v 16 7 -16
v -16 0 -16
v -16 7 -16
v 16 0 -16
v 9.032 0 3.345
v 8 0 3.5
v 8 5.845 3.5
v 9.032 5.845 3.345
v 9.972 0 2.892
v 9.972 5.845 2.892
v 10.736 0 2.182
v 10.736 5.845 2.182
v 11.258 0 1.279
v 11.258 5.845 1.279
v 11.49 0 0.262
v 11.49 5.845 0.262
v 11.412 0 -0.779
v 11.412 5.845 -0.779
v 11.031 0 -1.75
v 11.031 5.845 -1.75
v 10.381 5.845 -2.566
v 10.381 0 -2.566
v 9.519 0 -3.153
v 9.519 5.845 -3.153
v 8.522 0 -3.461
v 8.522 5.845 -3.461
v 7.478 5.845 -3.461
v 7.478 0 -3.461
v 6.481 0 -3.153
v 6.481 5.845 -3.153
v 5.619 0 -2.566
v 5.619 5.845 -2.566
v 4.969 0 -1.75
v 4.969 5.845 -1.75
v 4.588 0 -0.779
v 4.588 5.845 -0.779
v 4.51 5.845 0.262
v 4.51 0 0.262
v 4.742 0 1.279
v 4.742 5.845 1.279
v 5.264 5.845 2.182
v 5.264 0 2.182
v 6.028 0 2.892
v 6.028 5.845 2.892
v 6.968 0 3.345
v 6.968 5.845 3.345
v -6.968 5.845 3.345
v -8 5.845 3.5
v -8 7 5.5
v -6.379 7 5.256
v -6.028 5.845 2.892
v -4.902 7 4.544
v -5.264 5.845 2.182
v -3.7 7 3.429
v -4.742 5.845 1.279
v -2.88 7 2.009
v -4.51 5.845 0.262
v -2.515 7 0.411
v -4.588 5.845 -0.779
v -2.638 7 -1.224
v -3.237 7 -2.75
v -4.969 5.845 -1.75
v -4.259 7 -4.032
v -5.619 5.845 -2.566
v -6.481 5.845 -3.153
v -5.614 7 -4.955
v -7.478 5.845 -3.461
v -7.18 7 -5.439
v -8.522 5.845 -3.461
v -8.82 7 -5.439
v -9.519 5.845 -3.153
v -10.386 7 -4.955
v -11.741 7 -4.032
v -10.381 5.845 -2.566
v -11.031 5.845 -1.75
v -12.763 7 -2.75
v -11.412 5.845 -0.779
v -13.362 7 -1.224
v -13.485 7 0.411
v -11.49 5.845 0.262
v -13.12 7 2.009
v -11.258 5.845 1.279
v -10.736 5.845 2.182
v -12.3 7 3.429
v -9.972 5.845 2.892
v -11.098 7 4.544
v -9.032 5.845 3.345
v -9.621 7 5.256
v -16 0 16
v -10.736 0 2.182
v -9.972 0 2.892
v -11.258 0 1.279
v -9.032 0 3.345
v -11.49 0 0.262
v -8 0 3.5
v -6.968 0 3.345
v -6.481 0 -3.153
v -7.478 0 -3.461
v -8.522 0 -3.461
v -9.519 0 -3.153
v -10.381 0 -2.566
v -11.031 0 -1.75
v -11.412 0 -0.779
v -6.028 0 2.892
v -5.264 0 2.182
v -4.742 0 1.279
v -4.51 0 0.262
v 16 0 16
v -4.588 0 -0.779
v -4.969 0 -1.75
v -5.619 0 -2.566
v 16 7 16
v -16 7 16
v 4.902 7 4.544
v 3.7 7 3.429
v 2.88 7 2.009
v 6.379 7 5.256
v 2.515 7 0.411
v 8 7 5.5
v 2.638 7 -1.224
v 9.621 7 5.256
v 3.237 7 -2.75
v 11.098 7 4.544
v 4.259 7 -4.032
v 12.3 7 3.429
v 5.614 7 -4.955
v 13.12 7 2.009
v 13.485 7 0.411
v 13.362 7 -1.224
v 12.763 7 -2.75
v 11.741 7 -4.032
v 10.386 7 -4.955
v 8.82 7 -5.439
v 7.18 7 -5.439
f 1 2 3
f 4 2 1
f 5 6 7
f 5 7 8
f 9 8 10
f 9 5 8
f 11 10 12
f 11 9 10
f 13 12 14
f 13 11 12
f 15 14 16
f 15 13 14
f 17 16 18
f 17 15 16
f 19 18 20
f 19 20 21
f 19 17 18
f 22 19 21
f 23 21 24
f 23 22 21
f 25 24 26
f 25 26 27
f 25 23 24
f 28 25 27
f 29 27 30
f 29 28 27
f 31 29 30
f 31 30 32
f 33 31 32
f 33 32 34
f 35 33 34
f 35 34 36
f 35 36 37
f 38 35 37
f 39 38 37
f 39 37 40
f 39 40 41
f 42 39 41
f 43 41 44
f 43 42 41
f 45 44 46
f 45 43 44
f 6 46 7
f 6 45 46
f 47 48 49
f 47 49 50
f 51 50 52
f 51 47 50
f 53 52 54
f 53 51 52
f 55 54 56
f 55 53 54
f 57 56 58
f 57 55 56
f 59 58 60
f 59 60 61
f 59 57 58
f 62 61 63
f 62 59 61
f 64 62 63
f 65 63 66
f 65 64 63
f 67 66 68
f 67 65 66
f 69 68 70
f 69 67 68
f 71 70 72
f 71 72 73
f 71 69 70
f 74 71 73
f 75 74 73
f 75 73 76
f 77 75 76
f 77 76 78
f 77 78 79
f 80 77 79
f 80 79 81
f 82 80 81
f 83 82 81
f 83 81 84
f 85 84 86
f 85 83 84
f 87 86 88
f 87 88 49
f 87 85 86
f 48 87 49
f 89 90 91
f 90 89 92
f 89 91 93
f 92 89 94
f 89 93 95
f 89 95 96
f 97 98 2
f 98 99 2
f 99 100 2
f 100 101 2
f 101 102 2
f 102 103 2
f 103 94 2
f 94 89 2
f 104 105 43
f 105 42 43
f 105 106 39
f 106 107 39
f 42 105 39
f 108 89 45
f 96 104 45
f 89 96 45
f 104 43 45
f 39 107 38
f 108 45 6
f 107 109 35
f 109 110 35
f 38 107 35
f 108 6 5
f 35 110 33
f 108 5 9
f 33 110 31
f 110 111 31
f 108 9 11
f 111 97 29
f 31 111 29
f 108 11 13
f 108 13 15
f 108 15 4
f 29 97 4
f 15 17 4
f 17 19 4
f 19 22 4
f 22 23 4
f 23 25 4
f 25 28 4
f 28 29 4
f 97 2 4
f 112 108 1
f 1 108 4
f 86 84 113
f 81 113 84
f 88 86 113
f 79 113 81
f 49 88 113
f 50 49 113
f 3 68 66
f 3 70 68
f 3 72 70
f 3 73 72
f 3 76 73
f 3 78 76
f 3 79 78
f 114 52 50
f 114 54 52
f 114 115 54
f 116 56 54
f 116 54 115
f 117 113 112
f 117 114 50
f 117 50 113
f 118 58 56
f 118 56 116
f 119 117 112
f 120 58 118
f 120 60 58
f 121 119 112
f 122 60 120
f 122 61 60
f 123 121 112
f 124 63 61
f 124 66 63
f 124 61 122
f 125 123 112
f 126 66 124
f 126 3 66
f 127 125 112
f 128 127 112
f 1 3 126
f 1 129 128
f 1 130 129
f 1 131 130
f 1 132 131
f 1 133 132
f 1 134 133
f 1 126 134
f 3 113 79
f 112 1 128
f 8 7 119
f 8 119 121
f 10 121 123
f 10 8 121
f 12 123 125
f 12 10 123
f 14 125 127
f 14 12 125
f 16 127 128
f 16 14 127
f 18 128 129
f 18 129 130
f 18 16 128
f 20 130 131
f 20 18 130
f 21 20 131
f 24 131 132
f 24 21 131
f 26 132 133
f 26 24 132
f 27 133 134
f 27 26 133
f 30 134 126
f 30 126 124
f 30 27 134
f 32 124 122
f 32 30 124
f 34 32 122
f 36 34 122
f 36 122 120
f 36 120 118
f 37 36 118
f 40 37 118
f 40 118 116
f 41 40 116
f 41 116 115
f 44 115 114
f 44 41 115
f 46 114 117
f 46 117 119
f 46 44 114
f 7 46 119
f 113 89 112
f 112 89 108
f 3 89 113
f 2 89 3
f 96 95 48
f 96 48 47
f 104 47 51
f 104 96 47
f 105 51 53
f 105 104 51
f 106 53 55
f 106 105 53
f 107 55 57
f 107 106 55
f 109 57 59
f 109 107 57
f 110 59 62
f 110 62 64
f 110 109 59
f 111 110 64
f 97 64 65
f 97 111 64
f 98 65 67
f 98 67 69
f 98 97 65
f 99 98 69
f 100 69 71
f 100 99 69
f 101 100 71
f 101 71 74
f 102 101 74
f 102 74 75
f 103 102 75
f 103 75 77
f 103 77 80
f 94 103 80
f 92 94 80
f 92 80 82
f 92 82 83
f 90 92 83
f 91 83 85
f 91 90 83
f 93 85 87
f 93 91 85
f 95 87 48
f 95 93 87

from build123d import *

# Parameters (mm, degrees)
SKETCH1_W           = 32
SKETCH1_H           = 32
SKETCH1_R           = 3.5
BOSS_EXTRUDE1_DEPTH = 7
CHAMFER2_SIZE       = 2
CHAMFER2_SIZE2      = 1.154700538


with BuildPart() as part:
    # Sketch1 → Boss-Extrude1 (new body)
    with BuildSketch(Plane(origin=(0, 0, 0), x_dir=(1, 0, 0), z_dir=(0, 1, 0))):
        Rectangle(SKETCH1_W, SKETCH1_H)
        with Locations(Location((-8, 0, 0), (0, 0, 270))):
            Circle(SKETCH1_R, mode=Mode.SUBTRACT)
        with Locations(Location((8, 0, 0), (0, 0, 270))):
            Circle(SKETCH1_R, mode=Mode.SUBTRACT)
    extrude(amount=BOSS_EXTRUDE1_DEPTH)

    # Chamfer2
    chamfer2_edges = [part.edges().sort_by_distance(p)[0] for p in [
        (-8, 7, -3.5),
        (8, 7, -3.5),
    ]]
    chamfer2_side = [part.faces().sort_by_distance(p)[0] for p in [
        (0, 7, 0),
    ]]
    chamfer(chamfer2_edges, length=CHAMFER2_SIZE, length2=CHAMFER2_SIZE2, reference=chamfer2_side[0])


solid = part.part
